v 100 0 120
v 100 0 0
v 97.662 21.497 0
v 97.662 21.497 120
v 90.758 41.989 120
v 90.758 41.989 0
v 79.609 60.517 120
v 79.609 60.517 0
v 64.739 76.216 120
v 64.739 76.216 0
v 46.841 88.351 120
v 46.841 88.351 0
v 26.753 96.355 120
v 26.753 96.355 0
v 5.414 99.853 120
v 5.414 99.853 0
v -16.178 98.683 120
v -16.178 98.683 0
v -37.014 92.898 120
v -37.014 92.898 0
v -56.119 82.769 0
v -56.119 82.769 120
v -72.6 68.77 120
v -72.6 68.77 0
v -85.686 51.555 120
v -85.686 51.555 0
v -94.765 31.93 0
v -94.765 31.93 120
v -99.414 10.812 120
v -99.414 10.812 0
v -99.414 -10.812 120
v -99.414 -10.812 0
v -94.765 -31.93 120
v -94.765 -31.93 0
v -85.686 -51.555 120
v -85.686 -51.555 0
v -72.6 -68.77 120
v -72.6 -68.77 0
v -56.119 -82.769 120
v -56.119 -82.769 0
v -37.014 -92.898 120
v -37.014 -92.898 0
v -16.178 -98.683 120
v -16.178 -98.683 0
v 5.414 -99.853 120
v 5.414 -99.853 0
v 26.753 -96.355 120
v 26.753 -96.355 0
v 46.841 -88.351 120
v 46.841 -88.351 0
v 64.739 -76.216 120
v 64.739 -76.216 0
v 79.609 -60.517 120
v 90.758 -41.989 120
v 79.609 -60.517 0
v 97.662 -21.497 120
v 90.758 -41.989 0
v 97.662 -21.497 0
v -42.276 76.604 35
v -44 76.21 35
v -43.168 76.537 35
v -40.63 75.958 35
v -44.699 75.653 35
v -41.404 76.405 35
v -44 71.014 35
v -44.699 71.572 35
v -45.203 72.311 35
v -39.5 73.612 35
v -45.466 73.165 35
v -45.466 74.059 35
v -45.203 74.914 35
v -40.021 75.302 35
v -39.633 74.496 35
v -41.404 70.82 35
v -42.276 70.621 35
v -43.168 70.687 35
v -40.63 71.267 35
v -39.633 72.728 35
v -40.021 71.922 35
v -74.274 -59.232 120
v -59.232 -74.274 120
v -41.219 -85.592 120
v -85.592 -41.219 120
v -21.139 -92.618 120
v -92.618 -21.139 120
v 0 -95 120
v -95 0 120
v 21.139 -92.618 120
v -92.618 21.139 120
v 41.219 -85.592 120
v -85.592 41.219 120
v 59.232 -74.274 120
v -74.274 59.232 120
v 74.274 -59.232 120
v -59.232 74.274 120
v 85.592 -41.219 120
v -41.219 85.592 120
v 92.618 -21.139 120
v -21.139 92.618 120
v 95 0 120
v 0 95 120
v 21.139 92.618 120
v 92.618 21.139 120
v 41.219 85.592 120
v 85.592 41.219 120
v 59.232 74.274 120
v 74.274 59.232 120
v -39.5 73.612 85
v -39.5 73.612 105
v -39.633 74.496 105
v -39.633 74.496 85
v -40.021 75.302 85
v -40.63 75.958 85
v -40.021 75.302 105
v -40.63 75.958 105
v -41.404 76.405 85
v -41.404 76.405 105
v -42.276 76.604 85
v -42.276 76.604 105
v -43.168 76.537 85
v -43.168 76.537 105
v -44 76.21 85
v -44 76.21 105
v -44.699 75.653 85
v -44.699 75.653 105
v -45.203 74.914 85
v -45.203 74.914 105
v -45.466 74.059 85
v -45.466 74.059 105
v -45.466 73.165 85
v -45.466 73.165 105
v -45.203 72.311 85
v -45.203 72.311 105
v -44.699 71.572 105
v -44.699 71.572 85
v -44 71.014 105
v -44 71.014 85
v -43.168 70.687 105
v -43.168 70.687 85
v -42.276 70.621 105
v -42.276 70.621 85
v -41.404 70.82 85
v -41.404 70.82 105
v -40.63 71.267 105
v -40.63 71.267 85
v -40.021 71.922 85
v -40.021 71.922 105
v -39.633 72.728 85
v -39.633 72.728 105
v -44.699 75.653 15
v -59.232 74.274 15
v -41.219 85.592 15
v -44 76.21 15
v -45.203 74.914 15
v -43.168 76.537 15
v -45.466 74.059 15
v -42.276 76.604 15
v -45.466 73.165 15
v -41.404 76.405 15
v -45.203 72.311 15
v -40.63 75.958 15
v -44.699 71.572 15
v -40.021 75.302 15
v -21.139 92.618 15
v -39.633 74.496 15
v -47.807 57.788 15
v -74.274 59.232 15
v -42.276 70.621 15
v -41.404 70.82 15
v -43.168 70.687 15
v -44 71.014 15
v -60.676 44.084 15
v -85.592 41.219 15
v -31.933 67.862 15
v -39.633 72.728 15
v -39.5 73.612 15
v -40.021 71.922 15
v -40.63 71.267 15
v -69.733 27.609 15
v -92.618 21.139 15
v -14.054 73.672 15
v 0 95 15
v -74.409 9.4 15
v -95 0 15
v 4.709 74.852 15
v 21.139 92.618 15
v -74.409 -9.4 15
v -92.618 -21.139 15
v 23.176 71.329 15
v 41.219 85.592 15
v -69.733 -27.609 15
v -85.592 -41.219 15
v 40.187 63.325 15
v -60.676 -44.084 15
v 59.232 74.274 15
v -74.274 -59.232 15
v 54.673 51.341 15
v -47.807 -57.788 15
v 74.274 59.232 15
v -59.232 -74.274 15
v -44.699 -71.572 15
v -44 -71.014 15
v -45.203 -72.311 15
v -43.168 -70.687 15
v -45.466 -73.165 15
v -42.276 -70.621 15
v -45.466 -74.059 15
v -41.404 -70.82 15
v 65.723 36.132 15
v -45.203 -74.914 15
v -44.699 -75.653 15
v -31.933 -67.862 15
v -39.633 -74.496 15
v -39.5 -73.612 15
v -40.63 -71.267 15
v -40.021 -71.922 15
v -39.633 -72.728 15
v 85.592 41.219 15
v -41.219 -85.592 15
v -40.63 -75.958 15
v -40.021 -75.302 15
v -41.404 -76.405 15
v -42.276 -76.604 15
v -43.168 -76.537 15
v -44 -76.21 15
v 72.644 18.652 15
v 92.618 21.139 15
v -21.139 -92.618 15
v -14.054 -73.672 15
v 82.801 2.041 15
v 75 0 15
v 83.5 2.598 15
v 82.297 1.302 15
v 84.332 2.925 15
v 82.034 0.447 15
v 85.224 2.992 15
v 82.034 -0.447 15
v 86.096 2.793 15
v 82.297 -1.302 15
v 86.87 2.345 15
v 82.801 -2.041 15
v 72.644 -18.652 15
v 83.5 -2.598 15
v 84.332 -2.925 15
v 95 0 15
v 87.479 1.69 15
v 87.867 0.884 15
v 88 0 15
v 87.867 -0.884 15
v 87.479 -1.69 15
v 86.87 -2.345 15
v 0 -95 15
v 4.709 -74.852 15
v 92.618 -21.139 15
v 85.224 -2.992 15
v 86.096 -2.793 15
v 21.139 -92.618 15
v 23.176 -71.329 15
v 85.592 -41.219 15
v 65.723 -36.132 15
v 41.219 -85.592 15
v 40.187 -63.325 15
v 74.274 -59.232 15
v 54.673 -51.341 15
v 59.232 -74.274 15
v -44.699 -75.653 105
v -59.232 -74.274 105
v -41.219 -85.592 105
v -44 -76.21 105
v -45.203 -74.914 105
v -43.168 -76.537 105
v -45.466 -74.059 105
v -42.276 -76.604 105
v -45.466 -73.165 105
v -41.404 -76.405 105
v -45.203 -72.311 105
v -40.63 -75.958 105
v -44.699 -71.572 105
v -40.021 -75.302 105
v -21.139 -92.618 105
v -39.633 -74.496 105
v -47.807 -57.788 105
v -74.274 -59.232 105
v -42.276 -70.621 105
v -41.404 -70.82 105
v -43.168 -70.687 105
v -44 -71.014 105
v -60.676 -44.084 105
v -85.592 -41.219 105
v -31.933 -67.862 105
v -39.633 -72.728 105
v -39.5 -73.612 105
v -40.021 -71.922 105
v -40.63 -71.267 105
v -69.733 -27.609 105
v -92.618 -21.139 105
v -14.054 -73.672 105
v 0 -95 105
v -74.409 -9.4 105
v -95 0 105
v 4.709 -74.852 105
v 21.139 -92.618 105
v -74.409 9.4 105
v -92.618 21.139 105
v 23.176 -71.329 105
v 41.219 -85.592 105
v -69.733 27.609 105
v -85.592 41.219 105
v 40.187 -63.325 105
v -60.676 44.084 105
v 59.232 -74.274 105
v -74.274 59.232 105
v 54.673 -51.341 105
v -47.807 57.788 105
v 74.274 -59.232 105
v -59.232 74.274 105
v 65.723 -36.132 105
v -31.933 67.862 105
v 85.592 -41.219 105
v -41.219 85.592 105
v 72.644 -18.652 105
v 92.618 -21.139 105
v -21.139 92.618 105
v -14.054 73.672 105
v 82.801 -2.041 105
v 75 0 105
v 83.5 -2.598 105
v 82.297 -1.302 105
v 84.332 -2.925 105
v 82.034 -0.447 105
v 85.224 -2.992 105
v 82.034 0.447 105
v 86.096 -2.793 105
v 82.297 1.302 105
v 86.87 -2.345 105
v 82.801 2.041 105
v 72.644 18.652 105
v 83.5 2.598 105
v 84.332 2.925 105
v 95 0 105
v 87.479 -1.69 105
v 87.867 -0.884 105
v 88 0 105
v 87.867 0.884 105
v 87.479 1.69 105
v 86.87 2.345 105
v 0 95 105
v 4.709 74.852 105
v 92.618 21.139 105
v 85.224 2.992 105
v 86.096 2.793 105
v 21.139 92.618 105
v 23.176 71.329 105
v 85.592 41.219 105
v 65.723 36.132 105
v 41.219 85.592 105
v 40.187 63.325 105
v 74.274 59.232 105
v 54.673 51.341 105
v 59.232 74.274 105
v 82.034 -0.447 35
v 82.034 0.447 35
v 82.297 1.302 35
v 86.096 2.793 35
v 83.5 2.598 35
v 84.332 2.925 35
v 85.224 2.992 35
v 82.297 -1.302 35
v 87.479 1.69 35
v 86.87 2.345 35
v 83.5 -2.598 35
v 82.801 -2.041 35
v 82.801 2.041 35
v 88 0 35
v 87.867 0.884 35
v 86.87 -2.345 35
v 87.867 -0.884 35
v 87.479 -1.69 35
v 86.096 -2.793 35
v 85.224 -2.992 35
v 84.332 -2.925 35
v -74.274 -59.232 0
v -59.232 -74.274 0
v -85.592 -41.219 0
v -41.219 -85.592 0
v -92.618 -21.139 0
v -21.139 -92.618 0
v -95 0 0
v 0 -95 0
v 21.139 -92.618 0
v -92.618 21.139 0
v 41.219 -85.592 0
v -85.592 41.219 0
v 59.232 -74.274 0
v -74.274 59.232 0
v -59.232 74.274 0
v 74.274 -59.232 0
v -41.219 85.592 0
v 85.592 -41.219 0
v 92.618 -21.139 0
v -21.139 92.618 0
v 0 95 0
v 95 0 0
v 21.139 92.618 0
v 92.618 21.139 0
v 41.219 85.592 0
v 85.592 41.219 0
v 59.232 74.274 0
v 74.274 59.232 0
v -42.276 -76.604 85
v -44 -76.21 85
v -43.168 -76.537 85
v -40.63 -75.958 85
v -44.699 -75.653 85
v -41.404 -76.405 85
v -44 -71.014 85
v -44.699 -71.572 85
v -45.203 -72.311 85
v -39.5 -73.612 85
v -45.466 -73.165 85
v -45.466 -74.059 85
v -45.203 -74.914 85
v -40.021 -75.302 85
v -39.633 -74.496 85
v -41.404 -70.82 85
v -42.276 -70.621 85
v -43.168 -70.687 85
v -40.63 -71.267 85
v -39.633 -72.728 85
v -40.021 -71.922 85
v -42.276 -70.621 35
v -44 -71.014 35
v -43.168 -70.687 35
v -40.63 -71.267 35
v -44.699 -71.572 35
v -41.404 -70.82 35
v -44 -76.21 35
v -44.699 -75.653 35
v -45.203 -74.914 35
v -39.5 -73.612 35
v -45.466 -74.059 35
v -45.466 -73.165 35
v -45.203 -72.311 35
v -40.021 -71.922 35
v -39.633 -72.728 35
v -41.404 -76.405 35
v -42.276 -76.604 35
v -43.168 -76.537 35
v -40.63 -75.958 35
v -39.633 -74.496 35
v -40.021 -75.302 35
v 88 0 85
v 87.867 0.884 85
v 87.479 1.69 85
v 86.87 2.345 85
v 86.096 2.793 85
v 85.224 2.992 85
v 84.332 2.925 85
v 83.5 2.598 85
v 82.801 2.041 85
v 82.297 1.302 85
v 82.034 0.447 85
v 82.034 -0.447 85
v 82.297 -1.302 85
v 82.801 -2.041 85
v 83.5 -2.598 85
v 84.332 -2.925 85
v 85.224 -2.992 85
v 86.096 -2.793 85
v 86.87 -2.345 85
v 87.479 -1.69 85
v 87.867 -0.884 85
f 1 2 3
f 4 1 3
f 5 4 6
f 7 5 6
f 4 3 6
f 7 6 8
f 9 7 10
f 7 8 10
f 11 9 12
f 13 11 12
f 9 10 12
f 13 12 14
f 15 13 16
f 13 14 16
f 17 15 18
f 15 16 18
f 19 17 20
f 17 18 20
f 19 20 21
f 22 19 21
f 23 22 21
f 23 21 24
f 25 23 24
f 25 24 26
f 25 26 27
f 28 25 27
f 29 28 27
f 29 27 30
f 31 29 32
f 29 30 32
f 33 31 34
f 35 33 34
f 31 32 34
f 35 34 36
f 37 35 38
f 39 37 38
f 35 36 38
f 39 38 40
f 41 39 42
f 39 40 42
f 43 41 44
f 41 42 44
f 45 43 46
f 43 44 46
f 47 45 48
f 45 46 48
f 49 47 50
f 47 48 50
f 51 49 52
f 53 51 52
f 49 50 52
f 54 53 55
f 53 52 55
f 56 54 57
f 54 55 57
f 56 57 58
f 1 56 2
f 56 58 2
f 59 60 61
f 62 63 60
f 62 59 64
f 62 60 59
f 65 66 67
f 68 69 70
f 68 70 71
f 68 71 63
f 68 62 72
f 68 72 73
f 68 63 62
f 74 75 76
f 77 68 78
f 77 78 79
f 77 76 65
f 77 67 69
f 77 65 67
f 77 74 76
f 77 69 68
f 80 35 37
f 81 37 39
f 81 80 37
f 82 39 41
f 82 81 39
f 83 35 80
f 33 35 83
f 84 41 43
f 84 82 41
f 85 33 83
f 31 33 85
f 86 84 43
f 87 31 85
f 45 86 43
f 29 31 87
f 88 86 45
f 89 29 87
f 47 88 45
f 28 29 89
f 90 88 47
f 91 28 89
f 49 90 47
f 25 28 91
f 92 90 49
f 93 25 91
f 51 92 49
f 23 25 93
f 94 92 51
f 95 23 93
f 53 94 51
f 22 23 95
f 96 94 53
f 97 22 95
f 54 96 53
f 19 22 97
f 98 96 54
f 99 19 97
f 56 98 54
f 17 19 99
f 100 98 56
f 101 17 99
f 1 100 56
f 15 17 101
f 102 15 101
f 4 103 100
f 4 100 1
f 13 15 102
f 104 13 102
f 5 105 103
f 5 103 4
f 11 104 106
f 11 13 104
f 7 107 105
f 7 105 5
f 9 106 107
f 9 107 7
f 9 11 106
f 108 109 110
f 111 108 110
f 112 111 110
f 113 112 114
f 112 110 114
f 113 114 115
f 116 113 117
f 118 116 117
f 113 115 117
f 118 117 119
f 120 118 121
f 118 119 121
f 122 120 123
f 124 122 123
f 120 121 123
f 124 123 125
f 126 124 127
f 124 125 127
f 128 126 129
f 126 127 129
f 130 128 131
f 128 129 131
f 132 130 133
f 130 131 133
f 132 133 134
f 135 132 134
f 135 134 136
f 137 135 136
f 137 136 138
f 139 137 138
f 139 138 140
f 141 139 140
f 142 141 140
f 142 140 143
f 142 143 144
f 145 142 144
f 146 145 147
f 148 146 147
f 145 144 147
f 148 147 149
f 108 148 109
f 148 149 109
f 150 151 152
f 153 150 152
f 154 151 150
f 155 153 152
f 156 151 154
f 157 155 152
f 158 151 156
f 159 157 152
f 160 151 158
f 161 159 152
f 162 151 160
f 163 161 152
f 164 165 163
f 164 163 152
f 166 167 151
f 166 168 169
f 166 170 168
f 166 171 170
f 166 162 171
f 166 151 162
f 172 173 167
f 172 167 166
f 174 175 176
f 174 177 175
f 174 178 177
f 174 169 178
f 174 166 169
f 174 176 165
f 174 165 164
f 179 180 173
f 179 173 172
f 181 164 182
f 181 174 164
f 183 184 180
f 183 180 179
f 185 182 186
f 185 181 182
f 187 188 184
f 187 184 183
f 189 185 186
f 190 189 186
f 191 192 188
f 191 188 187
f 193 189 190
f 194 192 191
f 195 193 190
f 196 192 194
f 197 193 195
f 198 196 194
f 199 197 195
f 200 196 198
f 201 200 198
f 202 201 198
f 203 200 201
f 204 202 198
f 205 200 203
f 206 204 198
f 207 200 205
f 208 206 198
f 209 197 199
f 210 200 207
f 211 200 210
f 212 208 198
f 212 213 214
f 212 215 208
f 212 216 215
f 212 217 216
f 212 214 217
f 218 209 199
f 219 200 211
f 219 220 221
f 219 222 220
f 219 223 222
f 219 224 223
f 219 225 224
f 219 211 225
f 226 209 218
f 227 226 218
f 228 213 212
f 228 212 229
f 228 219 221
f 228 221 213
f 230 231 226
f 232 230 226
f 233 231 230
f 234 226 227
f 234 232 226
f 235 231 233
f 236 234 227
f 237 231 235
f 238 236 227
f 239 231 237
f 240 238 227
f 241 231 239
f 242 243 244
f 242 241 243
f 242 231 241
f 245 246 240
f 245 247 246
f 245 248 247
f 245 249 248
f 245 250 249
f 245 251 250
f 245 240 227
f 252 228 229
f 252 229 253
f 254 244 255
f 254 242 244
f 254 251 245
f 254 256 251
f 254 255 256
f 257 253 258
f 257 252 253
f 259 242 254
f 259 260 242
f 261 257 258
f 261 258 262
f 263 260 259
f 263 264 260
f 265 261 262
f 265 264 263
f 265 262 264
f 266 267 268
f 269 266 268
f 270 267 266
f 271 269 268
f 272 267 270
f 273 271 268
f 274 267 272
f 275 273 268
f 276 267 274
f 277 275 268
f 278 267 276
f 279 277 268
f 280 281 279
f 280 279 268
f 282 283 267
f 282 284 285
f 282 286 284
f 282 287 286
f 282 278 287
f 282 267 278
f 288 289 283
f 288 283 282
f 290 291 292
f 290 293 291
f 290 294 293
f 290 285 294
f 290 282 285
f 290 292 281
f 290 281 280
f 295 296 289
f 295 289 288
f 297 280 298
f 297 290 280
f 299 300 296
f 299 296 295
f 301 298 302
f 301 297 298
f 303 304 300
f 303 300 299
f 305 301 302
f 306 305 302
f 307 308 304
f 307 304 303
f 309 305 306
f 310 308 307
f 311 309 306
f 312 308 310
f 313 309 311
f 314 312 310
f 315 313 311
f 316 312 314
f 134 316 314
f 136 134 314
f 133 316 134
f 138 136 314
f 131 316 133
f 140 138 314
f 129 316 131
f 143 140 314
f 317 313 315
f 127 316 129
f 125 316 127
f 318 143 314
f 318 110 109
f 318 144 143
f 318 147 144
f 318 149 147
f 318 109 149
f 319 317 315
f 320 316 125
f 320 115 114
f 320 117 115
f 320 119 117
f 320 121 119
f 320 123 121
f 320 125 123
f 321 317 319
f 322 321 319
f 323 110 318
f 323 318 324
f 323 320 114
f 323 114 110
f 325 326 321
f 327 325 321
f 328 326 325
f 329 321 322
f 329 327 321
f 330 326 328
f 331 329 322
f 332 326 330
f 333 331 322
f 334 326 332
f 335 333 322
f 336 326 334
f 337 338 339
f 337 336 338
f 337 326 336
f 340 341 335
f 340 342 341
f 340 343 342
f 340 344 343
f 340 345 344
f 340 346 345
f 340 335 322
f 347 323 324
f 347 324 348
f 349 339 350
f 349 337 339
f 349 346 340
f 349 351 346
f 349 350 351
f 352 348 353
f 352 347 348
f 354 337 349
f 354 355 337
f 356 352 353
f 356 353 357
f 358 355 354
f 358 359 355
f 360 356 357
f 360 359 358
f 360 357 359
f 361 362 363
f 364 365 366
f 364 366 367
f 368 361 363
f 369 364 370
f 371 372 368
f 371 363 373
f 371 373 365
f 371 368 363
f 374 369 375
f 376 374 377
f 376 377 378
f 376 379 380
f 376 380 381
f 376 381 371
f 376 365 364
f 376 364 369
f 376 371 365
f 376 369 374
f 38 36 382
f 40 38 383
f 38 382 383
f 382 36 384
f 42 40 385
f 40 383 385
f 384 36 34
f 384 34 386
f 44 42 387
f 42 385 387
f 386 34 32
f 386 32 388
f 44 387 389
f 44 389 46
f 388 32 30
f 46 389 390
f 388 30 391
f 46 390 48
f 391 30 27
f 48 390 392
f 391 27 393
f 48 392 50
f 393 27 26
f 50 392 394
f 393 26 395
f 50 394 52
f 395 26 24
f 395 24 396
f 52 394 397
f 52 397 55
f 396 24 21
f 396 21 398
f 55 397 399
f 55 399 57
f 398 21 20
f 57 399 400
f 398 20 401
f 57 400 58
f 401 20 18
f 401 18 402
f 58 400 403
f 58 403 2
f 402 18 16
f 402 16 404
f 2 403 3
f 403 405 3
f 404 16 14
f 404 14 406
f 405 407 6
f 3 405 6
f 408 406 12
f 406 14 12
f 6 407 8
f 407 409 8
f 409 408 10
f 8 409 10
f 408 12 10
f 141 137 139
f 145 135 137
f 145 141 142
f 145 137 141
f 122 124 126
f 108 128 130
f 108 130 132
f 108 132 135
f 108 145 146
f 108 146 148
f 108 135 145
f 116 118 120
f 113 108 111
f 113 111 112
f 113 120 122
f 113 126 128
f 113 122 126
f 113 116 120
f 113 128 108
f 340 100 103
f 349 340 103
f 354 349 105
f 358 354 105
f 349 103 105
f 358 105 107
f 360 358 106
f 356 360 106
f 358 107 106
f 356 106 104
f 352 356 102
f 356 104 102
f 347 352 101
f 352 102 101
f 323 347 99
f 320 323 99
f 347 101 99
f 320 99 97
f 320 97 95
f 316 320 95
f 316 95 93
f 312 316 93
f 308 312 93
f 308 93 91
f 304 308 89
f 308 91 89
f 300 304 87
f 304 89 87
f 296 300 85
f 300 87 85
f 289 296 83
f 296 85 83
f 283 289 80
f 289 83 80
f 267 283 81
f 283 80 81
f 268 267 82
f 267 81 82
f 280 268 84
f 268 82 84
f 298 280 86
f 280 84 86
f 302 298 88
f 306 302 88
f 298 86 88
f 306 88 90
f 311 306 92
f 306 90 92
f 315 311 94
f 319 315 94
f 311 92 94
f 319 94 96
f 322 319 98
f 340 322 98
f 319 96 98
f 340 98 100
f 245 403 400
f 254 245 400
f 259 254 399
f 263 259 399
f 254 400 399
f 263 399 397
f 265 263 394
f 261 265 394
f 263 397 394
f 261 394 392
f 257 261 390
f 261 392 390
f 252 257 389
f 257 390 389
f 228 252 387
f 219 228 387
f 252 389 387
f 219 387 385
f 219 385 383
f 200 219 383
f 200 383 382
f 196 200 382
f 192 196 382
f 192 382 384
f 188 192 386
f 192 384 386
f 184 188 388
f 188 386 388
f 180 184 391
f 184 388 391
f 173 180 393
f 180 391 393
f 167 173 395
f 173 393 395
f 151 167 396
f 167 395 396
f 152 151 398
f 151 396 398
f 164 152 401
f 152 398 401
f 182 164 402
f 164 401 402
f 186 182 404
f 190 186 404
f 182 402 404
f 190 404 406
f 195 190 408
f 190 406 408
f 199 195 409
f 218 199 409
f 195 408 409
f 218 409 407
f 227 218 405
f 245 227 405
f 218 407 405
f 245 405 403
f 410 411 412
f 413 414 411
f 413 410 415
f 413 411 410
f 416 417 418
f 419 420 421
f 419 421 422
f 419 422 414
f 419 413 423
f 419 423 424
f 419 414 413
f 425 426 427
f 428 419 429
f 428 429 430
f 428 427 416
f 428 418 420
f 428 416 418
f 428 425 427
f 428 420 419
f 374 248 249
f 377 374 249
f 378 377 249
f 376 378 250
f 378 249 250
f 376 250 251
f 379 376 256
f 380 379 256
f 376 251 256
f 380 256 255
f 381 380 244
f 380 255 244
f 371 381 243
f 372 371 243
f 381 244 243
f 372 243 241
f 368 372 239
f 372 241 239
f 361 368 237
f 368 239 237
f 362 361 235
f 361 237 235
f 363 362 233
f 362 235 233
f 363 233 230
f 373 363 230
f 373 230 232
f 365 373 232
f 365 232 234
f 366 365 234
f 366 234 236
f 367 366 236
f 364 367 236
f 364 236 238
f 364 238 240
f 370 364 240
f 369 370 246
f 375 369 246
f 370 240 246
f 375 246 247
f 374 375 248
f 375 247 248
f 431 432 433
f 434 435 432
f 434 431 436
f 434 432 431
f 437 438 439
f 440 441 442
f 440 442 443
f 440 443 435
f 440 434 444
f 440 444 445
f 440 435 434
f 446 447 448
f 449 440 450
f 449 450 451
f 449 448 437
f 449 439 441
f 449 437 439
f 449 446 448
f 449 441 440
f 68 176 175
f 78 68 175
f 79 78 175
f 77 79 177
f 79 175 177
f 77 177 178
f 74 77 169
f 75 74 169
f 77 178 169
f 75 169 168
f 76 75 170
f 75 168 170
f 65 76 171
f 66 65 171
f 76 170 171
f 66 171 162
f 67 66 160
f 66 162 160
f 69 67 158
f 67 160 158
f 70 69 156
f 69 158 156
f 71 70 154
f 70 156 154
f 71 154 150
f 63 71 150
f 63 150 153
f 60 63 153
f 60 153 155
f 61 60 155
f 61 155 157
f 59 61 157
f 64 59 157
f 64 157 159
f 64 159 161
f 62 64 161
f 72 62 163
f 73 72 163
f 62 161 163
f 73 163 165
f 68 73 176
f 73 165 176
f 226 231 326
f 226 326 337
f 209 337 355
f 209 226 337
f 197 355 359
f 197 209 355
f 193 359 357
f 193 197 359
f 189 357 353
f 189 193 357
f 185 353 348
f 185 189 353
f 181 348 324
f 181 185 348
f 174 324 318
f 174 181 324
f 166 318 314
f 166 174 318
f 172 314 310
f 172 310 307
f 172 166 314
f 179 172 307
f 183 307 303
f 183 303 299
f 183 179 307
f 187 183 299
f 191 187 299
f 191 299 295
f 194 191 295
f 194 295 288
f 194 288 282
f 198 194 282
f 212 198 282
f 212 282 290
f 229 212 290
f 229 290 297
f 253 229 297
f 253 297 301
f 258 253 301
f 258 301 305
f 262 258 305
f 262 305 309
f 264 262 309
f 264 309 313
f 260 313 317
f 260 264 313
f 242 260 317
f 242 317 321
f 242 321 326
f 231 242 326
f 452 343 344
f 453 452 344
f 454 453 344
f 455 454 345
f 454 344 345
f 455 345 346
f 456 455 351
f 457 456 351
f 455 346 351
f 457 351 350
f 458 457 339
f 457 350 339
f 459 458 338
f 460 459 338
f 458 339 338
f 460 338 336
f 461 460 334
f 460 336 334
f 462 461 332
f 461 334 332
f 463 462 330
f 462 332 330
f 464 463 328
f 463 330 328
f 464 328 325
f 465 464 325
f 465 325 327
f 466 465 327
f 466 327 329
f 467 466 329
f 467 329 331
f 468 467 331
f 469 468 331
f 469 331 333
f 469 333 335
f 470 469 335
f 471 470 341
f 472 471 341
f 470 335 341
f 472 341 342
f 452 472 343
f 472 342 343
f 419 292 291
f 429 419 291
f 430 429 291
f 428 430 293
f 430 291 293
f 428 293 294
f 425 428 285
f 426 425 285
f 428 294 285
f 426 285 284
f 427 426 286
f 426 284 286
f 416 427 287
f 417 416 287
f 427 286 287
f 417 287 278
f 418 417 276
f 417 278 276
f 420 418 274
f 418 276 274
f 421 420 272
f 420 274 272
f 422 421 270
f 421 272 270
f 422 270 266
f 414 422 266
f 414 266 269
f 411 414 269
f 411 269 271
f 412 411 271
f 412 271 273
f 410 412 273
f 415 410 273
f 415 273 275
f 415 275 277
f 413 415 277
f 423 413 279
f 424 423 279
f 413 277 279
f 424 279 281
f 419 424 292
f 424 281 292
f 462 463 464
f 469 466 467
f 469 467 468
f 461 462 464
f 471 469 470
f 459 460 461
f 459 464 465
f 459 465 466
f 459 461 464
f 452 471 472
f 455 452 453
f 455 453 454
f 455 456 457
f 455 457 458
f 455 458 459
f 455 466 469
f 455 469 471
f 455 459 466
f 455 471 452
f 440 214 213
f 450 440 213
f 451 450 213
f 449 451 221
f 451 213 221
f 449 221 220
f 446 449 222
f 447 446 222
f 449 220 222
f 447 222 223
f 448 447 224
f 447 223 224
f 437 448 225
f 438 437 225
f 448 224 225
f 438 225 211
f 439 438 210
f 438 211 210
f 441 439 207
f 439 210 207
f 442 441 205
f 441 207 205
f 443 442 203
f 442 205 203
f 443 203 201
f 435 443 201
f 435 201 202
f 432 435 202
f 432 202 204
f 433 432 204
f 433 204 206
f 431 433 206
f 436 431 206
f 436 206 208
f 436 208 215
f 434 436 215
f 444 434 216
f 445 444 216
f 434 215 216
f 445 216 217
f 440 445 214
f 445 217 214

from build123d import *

# Parameters (mm, degrees)
F0_R     = 100
F0_R_2   = 75
F1_DEPTH = 120
F2_R     = 95
F2_R_2   = 75
F3_DEPTH = 15
F4_R     = 95
F4_R_2   = 75
F5_DEPTH = 15
F6_R     = 3
F7_DEPTH = 20
F8_R     = 3
F9_DEPTH = 20


with BuildPart() as f1:
    # F0 (on Top) → F1 (new body)
    with BuildSketch(Plane.XY):
        Circle(F0_R)
        Circle(F0_R_2, mode=Mode.SUBTRACT)
    extrude(amount=F1_DEPTH)

    # F2 (on face) → F3 (cut)
    with BuildSketch(Plane.XY.offset(120)):
        Circle(F2_R)
        Circle(F2_R_2, mode=Mode.SUBTRACT)
    extrude(amount=-F3_DEPTH, mode=Mode.SUBTRACT)

    # F4 (on face) → F5 (cut)
    with BuildSketch(Plane(origin=(0, 0, 0), x_dir=(1, 0, 0), z_dir=(0, 0, -1))):
        Circle(F4_R)
        Circle(F4_R_2, mode=Mode.SUBTRACT)
    extrude(amount=-F5_DEPTH, mode=Mode.SUBTRACT)

    # F6 (on face) → F7 (cut)
    with BuildSketch(Plane(origin=(0, 0, 15), x_dir=(1, 0, 0), z_dir=(0, 0, -1))):
        with Locations((85, 0)):
            Circle(F6_R)
        with Locations((-42.5, -73.6121593217)):
            Circle(F6_R)
        with Locations((-42.5, 73.6121593217)):
            Circle(F6_R)
    extrude(amount=-F7_DEPTH, mode=Mode.SUBTRACT)

    # F8 (on face) → F9 (cut)
    with BuildSketch(Plane.XY.offset(105)):
        with Locations((85, 0)):
            Circle(F8_R)
        with Locations((-42.5, -73.6121593217)):
            Circle(F8_R)
        with Locations((-42.5, 73.6121593217)):
            Circle(F8_R)
    extrude(amount=-F9_DEPTH, mode=Mode.SUBTRACT)


solid = f1.part
